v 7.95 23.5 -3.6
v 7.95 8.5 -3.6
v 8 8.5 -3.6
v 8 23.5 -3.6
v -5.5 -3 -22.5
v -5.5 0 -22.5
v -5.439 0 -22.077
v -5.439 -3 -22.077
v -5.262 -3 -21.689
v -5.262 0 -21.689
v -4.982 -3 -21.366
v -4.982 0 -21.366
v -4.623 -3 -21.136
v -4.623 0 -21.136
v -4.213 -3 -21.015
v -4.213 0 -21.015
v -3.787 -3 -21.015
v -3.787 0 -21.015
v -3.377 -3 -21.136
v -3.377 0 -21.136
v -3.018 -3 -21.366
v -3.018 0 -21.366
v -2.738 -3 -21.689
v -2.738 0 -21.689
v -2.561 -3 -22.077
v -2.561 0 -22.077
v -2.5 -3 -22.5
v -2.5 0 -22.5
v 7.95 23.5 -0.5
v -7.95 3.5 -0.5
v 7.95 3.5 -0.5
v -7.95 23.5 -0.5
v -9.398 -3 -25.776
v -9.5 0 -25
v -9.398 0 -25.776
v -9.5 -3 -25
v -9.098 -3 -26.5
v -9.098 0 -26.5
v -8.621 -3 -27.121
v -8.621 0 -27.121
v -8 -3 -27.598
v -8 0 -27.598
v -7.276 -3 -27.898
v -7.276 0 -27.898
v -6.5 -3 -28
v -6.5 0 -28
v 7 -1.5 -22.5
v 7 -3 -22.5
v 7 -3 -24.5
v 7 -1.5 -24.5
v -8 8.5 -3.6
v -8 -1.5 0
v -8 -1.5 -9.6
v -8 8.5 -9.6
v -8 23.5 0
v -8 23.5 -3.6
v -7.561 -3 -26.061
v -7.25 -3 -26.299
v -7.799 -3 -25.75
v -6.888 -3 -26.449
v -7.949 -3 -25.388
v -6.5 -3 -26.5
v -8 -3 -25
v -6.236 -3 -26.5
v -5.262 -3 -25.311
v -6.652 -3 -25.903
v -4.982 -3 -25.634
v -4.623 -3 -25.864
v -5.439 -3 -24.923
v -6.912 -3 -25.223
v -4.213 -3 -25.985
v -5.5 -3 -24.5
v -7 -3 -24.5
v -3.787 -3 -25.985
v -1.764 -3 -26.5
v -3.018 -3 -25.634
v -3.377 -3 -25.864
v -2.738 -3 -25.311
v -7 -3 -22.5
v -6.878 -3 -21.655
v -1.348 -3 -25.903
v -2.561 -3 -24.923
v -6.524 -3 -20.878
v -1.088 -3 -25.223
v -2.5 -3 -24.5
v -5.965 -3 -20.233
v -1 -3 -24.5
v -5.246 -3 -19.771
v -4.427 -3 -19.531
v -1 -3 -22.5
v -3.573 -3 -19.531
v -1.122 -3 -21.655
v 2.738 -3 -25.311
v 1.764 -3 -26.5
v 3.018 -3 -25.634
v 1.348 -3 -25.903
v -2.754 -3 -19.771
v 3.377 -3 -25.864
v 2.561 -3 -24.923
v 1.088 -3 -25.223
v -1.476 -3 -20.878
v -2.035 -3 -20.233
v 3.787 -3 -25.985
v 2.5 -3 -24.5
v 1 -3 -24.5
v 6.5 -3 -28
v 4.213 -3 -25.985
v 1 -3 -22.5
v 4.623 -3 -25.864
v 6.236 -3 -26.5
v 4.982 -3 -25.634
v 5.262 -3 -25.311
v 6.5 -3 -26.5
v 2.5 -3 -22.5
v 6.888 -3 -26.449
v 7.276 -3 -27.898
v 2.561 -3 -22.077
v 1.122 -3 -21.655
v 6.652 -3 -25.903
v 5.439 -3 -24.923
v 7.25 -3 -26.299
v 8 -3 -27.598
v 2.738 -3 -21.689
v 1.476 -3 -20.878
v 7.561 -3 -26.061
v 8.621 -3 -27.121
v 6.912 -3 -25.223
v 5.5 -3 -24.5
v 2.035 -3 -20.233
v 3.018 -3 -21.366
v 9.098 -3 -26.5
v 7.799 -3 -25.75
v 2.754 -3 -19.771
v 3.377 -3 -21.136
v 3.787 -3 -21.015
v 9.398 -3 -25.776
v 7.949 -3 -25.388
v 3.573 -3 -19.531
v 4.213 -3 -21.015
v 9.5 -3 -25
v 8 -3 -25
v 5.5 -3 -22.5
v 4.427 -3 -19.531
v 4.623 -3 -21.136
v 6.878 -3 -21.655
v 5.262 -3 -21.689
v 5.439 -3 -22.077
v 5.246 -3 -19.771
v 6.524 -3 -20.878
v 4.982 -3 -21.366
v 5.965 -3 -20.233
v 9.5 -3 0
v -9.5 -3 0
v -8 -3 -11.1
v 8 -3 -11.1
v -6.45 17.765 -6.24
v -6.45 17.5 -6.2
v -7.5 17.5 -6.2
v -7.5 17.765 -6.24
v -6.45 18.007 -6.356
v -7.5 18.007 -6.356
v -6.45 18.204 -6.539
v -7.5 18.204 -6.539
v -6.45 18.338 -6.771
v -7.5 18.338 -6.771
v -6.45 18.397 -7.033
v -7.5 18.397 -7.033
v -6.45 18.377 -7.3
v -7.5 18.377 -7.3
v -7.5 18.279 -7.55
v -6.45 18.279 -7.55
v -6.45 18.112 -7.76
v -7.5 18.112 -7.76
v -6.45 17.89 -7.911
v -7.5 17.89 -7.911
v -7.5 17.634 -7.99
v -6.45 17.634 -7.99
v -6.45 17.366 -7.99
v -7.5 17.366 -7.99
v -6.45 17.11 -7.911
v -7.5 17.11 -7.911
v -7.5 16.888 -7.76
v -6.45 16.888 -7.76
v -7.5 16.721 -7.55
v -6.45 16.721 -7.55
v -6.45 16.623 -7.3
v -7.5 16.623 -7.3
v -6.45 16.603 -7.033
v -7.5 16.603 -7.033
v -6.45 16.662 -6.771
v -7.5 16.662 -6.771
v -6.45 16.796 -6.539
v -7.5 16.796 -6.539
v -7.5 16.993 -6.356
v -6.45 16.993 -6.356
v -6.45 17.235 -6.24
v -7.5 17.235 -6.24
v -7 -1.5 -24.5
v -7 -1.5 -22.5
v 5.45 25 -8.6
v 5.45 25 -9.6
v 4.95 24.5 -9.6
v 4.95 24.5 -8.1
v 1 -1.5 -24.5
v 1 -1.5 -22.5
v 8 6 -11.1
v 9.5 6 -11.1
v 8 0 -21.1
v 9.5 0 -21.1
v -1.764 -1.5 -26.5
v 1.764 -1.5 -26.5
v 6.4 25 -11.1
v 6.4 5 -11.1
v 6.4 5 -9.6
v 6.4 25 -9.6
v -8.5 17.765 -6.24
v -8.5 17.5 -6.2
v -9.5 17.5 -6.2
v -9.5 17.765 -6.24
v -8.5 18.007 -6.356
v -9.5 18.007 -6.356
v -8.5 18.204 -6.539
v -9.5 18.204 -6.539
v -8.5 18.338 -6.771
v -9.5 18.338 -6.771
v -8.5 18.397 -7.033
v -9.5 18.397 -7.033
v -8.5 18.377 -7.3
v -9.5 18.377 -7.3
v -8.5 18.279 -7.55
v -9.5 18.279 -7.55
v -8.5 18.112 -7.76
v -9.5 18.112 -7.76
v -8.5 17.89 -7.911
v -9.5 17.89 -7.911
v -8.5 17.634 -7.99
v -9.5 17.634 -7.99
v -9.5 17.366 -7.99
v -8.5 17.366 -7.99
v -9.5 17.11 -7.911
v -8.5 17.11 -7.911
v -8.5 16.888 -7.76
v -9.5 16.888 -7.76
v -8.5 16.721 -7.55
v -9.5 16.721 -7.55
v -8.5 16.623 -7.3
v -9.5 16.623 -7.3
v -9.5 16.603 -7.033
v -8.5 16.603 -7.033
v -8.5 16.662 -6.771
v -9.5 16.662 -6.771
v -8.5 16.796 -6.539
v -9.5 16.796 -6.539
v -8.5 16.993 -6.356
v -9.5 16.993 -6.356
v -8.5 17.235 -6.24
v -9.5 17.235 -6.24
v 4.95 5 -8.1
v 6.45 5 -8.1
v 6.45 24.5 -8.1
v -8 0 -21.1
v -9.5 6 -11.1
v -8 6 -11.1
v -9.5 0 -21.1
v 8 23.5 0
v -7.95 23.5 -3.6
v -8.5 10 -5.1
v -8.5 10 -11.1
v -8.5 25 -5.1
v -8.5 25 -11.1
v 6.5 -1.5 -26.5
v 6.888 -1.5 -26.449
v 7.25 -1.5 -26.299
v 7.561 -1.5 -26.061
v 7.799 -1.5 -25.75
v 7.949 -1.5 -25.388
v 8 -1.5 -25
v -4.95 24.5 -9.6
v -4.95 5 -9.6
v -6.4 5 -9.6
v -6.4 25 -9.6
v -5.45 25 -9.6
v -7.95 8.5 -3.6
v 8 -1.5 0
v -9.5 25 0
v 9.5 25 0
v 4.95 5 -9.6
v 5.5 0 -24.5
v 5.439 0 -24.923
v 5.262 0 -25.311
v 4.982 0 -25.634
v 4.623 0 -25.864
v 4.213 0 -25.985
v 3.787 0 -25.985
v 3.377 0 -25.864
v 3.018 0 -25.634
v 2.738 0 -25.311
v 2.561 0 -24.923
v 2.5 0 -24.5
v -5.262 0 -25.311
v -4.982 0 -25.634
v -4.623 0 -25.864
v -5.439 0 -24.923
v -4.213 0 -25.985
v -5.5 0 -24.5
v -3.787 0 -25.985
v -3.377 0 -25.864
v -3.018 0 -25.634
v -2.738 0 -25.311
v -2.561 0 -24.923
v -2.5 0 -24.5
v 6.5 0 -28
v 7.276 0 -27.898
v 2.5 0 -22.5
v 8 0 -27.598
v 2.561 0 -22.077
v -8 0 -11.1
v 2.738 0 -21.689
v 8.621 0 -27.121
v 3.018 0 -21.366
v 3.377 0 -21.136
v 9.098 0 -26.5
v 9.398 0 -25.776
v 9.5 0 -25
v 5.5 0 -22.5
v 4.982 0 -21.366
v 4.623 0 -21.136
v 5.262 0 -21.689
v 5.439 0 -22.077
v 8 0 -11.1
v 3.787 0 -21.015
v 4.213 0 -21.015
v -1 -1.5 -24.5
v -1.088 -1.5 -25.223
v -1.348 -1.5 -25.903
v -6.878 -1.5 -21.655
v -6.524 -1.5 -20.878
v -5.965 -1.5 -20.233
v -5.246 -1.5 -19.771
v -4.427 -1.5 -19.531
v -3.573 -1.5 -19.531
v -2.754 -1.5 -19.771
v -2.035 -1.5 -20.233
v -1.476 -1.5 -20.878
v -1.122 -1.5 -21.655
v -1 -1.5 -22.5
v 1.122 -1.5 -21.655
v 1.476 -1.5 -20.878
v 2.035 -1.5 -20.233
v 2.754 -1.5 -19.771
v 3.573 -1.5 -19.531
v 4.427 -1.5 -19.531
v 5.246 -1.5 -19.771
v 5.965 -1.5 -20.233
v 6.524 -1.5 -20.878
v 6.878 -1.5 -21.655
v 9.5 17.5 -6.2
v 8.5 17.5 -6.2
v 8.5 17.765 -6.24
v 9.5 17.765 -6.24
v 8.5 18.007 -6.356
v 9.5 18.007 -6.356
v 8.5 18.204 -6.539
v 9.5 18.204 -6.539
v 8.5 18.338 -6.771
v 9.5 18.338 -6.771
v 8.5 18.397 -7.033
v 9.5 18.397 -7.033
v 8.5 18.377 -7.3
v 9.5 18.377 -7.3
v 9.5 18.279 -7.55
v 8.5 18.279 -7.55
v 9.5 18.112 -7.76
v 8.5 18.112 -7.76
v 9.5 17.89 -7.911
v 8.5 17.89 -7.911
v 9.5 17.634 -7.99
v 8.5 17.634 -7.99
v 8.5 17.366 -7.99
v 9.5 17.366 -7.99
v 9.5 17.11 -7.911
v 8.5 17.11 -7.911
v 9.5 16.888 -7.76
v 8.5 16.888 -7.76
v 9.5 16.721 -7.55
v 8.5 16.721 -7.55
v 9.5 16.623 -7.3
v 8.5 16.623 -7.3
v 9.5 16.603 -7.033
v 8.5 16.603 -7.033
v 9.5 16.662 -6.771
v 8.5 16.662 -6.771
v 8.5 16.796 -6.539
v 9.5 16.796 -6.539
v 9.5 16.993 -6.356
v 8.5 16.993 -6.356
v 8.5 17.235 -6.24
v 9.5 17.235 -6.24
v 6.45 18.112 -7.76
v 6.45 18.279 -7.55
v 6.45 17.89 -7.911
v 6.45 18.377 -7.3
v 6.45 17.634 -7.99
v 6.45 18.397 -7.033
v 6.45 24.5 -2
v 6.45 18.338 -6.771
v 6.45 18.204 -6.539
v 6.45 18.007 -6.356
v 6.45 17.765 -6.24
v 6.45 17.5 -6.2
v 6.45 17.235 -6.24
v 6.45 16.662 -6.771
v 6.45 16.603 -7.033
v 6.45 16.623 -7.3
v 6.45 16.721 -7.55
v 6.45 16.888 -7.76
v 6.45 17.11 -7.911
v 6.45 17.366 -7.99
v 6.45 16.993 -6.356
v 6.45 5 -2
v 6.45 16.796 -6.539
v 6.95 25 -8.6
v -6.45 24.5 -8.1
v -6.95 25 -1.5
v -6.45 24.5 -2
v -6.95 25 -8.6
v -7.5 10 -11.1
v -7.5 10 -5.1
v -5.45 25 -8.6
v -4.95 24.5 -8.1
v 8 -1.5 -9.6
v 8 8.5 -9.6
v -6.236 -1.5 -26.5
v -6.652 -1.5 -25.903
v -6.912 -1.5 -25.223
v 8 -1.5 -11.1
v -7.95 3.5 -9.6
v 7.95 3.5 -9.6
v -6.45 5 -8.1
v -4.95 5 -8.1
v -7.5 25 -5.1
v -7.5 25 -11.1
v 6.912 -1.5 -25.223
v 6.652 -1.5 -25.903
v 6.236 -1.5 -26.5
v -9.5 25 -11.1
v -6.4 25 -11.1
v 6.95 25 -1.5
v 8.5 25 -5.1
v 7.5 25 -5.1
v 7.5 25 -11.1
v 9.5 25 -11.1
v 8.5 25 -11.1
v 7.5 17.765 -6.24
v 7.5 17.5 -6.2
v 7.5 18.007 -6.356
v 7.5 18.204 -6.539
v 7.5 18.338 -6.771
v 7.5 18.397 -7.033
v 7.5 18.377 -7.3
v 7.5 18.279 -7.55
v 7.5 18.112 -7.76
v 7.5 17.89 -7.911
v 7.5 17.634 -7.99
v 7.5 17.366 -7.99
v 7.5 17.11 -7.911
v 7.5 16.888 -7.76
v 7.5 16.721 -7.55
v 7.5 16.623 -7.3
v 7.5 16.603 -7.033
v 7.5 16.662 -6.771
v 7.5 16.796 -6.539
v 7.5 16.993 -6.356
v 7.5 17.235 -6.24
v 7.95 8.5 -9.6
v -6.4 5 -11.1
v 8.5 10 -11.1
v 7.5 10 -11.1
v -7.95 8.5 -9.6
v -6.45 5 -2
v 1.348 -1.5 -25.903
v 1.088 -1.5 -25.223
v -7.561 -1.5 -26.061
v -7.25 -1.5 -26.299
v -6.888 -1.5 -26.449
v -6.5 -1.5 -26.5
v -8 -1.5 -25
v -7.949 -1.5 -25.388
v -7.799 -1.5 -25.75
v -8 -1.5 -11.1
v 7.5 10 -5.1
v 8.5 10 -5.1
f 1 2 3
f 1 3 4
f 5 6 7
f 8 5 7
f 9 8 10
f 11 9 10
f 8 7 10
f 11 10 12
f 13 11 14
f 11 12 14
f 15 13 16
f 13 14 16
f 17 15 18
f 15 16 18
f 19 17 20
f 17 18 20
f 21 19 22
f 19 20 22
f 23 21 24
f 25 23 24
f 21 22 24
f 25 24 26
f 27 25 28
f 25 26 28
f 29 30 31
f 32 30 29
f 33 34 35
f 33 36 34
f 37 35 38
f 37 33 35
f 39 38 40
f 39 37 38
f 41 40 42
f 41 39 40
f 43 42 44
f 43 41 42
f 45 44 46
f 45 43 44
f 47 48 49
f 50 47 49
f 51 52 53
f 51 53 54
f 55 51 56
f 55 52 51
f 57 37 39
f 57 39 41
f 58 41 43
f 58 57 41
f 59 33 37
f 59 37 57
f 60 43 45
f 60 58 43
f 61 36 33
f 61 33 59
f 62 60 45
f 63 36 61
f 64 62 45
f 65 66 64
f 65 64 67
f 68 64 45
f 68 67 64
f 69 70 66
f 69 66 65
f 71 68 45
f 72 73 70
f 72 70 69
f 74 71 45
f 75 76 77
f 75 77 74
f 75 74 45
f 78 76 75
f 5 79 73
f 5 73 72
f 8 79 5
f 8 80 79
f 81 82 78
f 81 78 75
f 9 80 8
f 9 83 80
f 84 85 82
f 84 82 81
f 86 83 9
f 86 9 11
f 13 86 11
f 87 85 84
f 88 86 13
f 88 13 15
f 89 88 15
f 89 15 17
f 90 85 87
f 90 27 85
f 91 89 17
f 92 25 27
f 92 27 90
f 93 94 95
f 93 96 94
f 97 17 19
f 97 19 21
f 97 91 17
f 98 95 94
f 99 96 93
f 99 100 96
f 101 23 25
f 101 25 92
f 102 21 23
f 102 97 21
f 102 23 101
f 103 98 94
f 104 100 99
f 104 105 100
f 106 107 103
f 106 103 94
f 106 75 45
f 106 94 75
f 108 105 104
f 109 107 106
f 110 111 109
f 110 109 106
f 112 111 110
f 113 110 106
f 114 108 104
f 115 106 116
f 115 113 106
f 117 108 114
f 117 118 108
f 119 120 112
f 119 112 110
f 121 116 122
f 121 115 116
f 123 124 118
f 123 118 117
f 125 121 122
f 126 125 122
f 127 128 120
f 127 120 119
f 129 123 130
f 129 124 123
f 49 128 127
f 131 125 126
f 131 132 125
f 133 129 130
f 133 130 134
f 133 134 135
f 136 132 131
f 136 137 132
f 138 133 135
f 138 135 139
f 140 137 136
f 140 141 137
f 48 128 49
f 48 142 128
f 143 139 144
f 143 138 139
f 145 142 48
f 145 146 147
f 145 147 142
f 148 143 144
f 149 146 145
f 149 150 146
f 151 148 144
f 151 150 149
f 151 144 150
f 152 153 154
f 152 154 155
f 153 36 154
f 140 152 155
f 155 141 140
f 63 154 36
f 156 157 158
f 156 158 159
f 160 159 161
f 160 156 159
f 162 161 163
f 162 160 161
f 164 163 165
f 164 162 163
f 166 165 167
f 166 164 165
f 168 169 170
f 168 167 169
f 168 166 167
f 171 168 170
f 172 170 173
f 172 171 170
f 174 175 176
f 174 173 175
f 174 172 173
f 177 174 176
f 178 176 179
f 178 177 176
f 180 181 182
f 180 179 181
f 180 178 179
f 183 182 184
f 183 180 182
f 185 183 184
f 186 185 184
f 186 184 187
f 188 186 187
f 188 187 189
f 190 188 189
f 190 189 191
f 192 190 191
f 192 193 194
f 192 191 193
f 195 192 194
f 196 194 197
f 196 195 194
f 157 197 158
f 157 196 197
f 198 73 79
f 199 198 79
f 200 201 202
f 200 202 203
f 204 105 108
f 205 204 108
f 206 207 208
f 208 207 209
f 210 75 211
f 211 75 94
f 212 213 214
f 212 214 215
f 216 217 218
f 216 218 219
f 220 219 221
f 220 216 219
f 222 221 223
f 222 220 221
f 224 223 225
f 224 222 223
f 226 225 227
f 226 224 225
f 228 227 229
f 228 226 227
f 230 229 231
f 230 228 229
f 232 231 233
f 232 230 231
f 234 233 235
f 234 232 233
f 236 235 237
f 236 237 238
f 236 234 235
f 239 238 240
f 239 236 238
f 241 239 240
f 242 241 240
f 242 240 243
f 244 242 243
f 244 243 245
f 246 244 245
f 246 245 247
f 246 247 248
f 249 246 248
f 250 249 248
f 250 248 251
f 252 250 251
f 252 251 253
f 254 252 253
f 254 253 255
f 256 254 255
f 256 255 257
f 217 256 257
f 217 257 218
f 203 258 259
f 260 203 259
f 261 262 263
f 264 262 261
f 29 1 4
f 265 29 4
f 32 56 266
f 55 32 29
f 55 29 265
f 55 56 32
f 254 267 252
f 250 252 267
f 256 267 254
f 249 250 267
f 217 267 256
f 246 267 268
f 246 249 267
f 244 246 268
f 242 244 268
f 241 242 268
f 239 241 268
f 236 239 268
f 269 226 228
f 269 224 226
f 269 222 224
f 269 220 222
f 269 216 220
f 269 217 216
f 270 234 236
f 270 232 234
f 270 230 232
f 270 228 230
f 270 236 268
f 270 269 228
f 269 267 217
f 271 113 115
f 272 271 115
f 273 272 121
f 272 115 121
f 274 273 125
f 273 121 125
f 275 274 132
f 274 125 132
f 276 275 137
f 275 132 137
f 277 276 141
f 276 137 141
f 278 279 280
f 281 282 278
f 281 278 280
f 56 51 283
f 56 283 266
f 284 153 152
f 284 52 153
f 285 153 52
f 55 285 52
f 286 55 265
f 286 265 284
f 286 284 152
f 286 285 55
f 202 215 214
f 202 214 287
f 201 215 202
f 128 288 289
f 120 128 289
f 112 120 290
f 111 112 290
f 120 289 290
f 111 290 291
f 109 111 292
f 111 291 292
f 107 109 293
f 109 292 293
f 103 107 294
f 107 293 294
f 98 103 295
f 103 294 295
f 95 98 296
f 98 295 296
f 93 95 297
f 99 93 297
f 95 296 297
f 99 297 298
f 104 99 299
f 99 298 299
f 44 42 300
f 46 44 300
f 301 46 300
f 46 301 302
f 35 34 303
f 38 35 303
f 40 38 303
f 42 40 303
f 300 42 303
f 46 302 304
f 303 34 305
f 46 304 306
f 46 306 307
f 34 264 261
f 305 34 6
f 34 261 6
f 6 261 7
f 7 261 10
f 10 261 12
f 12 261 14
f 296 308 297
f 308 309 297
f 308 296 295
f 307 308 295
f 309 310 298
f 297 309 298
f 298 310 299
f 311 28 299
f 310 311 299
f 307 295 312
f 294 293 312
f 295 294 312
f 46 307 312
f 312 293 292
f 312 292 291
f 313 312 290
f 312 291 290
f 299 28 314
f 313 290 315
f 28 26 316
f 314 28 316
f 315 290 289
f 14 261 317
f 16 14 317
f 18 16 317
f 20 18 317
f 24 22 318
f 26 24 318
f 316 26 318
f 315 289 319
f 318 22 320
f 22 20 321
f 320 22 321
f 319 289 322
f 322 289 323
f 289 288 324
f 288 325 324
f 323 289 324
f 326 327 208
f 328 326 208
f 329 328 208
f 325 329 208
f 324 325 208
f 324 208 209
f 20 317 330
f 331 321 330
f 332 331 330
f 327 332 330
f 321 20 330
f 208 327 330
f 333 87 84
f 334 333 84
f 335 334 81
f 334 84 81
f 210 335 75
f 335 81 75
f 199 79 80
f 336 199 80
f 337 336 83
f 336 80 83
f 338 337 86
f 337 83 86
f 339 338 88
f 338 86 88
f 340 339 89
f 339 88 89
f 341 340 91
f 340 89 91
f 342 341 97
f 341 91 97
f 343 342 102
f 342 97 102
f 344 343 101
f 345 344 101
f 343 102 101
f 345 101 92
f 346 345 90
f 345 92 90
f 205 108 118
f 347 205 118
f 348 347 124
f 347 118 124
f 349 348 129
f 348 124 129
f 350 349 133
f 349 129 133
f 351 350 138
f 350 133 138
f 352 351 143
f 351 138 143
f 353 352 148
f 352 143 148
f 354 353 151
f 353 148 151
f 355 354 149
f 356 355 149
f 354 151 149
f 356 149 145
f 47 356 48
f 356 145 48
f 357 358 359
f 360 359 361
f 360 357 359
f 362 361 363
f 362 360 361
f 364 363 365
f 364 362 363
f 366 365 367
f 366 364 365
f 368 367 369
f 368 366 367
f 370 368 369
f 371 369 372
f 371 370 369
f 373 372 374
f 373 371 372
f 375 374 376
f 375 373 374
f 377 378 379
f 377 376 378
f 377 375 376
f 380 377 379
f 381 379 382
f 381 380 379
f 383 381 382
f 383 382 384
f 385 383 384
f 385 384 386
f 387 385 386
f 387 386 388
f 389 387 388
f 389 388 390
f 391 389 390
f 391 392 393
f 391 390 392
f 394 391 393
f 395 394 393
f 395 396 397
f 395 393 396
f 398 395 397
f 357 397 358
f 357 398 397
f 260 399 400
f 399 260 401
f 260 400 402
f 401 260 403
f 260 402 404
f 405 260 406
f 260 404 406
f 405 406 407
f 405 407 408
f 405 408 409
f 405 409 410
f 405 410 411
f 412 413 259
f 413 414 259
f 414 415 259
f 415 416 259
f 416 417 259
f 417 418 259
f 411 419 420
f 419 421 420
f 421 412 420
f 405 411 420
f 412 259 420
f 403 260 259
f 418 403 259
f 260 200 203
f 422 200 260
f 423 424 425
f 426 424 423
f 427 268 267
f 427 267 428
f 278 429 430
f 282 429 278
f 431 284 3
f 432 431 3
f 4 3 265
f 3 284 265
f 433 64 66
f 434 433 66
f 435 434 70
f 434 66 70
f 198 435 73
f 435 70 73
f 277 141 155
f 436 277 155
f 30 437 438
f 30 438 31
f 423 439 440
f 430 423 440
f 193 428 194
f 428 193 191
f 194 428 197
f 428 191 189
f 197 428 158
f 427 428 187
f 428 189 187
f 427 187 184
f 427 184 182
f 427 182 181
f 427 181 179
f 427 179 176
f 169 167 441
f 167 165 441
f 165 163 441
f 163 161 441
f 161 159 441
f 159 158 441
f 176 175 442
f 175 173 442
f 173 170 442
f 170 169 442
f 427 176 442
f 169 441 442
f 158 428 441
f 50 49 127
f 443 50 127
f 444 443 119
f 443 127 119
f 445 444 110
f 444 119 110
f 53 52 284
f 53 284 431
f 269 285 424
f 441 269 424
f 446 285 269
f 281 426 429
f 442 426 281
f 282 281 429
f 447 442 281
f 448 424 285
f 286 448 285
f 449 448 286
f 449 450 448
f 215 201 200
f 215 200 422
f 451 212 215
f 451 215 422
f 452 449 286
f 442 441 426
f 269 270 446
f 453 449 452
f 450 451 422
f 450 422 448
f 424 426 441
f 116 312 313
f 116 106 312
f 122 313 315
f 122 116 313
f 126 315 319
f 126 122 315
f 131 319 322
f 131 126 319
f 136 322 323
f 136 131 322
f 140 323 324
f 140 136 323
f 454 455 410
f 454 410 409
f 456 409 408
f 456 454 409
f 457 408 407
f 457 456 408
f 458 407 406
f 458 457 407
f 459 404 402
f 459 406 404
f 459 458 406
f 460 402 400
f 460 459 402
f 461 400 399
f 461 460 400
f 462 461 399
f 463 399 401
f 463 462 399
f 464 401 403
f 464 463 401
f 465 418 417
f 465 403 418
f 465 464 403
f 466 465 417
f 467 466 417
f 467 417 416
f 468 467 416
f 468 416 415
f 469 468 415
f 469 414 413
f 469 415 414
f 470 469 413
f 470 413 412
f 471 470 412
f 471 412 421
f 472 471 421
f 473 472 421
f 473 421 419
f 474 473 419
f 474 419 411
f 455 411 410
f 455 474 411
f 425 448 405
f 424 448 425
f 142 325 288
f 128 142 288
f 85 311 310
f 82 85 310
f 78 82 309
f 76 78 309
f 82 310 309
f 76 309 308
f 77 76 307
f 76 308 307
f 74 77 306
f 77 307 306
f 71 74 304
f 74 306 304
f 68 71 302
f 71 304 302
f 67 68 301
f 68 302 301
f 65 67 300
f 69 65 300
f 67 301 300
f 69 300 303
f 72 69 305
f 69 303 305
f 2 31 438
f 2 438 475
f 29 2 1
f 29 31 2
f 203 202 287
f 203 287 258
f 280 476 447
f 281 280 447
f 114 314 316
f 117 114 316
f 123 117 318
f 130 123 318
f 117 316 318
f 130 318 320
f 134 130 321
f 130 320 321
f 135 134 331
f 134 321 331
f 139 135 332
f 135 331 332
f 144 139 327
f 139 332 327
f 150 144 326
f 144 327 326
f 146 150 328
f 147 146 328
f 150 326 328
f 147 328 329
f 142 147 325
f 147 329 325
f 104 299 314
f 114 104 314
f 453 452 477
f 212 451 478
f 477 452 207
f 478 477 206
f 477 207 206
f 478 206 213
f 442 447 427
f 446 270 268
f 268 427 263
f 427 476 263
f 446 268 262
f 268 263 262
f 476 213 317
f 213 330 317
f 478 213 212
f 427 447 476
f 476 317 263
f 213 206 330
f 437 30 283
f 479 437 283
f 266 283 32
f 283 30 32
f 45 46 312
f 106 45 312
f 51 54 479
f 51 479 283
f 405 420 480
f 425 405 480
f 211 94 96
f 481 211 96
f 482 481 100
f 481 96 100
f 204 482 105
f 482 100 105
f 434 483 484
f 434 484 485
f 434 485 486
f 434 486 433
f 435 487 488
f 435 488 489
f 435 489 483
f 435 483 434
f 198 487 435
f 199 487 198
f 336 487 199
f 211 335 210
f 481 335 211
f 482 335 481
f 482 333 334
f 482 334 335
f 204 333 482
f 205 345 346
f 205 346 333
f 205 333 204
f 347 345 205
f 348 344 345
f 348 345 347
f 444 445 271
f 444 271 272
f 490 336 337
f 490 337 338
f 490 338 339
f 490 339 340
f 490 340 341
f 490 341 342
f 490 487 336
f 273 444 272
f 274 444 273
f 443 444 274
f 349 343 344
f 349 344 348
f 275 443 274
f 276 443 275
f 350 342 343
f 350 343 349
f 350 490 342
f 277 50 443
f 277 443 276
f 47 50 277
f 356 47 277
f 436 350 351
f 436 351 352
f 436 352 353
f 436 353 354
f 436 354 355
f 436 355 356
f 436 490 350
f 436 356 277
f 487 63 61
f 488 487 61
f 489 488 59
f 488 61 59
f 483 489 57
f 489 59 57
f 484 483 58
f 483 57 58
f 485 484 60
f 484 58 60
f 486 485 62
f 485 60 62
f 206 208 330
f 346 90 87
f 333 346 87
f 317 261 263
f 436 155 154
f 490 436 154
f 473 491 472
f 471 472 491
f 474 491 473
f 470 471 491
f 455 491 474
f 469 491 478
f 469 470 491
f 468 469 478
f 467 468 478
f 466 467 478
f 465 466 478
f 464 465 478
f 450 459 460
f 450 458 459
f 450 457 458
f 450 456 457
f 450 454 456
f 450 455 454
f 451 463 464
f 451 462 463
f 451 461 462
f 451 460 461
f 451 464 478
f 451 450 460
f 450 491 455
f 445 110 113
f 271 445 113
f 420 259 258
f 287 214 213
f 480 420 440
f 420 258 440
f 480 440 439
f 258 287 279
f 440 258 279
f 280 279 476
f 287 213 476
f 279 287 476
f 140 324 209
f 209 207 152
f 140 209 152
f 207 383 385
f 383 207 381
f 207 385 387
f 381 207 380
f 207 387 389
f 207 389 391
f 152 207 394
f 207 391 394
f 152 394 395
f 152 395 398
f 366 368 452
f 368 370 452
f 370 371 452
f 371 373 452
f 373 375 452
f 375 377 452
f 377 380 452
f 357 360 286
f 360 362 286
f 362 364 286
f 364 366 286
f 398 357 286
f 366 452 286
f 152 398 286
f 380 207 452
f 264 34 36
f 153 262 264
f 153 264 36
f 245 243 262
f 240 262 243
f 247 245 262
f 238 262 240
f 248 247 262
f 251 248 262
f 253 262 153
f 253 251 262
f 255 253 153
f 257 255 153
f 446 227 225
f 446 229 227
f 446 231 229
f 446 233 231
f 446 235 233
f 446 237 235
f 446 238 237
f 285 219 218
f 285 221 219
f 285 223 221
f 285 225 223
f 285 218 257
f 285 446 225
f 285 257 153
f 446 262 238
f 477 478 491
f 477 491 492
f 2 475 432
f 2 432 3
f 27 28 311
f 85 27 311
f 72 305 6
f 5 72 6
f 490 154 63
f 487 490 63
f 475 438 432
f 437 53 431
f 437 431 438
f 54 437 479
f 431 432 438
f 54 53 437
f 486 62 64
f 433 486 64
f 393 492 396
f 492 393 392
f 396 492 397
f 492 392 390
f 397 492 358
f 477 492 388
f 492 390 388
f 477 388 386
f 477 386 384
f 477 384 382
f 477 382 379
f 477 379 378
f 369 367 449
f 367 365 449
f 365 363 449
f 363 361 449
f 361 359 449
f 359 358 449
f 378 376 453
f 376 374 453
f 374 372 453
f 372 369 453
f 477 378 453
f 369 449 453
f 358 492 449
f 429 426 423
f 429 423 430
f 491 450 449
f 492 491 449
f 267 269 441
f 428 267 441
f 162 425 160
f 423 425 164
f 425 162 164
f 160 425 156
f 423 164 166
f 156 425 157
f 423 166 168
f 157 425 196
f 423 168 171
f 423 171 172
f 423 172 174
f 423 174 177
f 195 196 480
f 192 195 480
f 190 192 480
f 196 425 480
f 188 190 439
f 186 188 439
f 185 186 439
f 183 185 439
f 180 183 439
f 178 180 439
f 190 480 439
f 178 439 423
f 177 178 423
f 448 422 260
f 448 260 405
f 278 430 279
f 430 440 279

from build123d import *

# Parameters (mm, degrees)
EXTRUDE_1_DEPTH     = 25
SKETCH_2_W          = 19
SKETCH_2_H          = 28
EXTRUDE_2_DEPTH     = 3
SKETCH_3_W          = 1
SKETCH_3_H          = 6
CUT_EXTRUDE_1_DEPTH = 15
CUT_EXTRUDE_START   = -19
SKETCH_4_R          = 0.9
CUT_EXTRUDE_2_DEPTH = 19
FILLET_1_R          = 3
EXTRUDE_3_DEPTH     = 1.5
EXTRUDE_4_DEPTH     = 5
CHAMFER_1_SIZE      = 0.5
SHELL_START         = -8
SHELL_1_DEPTH       = 16
SHELL_1_2_DEPTH     = 0.05
SHELL_START_2       = 7.95
SHELL_1_3_DEPTH     = 0.05
CUT_EXTRUDE_3_DEPTH = 1.5
SKETCH_8_W          = 12.8
SKETCH_8_H          = 20
CUT_EXTRUDE_4_DEPTH = 1.5


# Read off the part's stored shape, not the designer's step: 抽壳1
with BuildPart() as part:
    # 草图1 → 凸台-拉伸1 (new body)
    with BuildSketch(Plane(origin=(0, 0, 0), x_dir=(1, 0, 0), z_dir=(0, 1, 0))):
        Polygon((-9.5, 11.1), (-9.5, 0), (9.5, 0), (9.5, 11.1), (4.95, 11.1), (4.95, 8.1), (6.45, 8.1), (6.45, 2), (-6.45, 2), (-6.45, 8.1), (-4.95, 8.1), (-4.95, 11.1), align=None)
    extrude(amount=EXTRUDE_1_DEPTH)

    # 草图2 → 凸台-拉伸2 (add)
    with BuildSketch(Plane.XZ):
        with Locations((0, -14)):
            Rectangle(SKETCH_2_W, SKETCH_2_H)
        with BuildLine():
            Line((-2.5, -22.5), (-2.5, -24.5))
            ThreePointArc((-2.5, -24.5), (-4, -26), (-5.5, -24.5))
            Line((-5.5, -24.5), (-5.5, -22.5))
            ThreePointArc((-5.5, -22.5), (-4, -21), (-2.5, -22.5))
        make_face(mode=Mode.SUBTRACT)
        with BuildLine():
            Line((2.5, -24.5), (2.5, -22.5))
            ThreePointArc((2.5, -22.5), (4, -21), (5.5, -22.5))
            Line((5.5, -22.5), (5.5, -24.5))
            ThreePointArc((5.5, -24.5), (4, -26), (2.5, -24.5))
        make_face(mode=Mode.SUBTRACT)
    extrude(amount=EXTRUDE_2_DEPTH)

    # 草图3 → 切除-拉伸1 (cut)
    with BuildSketch(Plane(origin=(0, 25, 0), x_dir=(1, 0, 0), z_dir=(0, 1, 0))):
        with Locations((-8, 8.1)):
            Rectangle(SKETCH_3_W, SKETCH_3_H)
        with Locations((8, 8.1)):
            Rectangle(SKETCH_3_W, SKETCH_3_H)
    extrude(amount=-CUT_EXTRUDE_1_DEPTH, mode=Mode.SUBTRACT)

    # 草图4 → 切除-拉伸2 (cut)
    with BuildSketch(Plane.ZY.offset(9.5).offset(CUT_EXTRUDE_START)):
        with Locations((-7.1, 17.5)):
            Circle(SKETCH_4_R)
    extrude(amount=CUT_EXTRUDE_2_DEPTH, mode=Mode.SUBTRACT)

    # 圆角1
    fillet_1_edges = [part.edges().sort_by_distance(p)[0] for p in [
        (9.5, -1.5, -28),
        (-9.5, -1.5, -28),
    ]]
    fillet(fillet_1_edges, radius=FILLET_1_R)

    # 草图5 → 凸台-拉伸3 (add)
    with BuildSketch(Plane.ZY.offset(9.5)):
        Polygon((-11.1, 0), (-11.1, 6), (-21.1, 0), align=None)
    extrude_3 = extrude(amount=-EXTRUDE_3_DEPTH)

    # 镜向1: 凸台-拉伸3 across plane
    add(extrude_3.mirror(Plane(origin=(0, 0, 0), x_dir=(0, 0, 1), z_dir=(1, 0, 0))))

    # 草图6 → 凸台-拉伸4 (add)
    with BuildSketch(Plane(origin=(0, 0, 0), x_dir=(1, 0, 0), z_dir=(0, 1, 0))):
        Polygon((-6.45, 2), (6.45, 2), (6.45, 8.1), (4.95, 8.1), (4.95, 11.1), (-4.95, 11.1), (-4.95, 8.1), (-6.45, 8.1), align=None)
    extrude(amount=EXTRUDE_4_DEPTH)

    # 倒角1
    chamfer_1_edges = [part.edges().sort_by_distance(p)[0] for p in [
        (4.95, 25, -9.6),
        (5.7, 25, -8.1),
        (6.45, 25, -5.05),
        (0, 25, -2),
        (-6.45, 25, -5.05),
        (-5.7, 25, -8.1),
        (-4.95, 25, -9.6),
    ]]
    chamfer(chamfer_1_edges, length=CHAMFER_1_SIZE)

    # 抽壳1 outline → 抽壳1 (cut)
    with BuildSketch(Plane.YZ.offset(SHELL_START)):
        Polygon((3.5, -0.5), (23.5, -0.5), (23.5, 0), (-1.5, 0), (-1.5, -9.6), (3.5, -9.6), align=None)
    extrude(amount=SHELL_1_DEPTH, mode=Mode.SUBTRACT)

    # Shell 1 2 outline → Shell 1 2 (cut)
    with BuildSketch(Plane.YZ.offset(SHELL_START)):
        Polygon((8.5, -3.6), (23.5, -3.6), (23.5, -0.5), (3.5, -0.5), (3.5, -9.6), (8.5, -9.6), align=None)
    extrude(amount=SHELL_1_2_DEPTH, mode=Mode.SUBTRACT)

    # Shell 1 3 outline → Shell 1 3 (cut)
    with BuildSketch(Plane.YZ.offset(SHELL_START_2)):
        Polygon((8.5, -3.6), (23.5, -3.6), (23.5, -0.5), (3.5, -0.5), (3.5, -9.6), (8.5, -9.6), align=None)
    extrude(amount=SHELL_1_3_DEPTH, mode=Mode.SUBTRACT)

    # 草图7 → 切除-拉伸3 (cut)
    with BuildSketch(Plane.XZ.offset(3)):
        with BuildLine():
            Line((8, -11.1), (-8, -11.1))
            Line((-8, -11.1), (-8, -25))
            ThreePointArc((-8, -25), (-7.560660172, -26.060660172), (-6.5, -26.5))
            Line((-6.5, -26.5), (-6.236067977, -26.5))
            ThreePointArc((-6.236067977, -26.5), (-6.802517077, -25.570466269), (-7, -24.5))
            Line((-7, -24.5), (-7, -22.5))
            ThreePointArc((-7, -22.5), (-4, -19.5), (-1, -22.5))
            Line((-1, -22.5), (-1, -24.5))
            ThreePointArc((-1, -24.5), (-1.197482923, -25.570466269), (-1.763932023, -26.5))
            Line((-1.763932023, -26.5), (1.763932023, -26.5))
            ThreePointArc((1.763932023, -26.5), (1.197482923, -25.570466269), (1, -24.5))
            Line((1, -24.5), (1, -22.5))
            ThreePointArc((1, -22.5), (4, -19.5), (7, -22.5))
            Line((7, -22.5), (7, -24.5))
            ThreePointArc((7, -24.5), (6.802517077, -25.570466269), (6.236067977, -26.5))
            Line((6.236067977, -26.5), (6.5, -26.5))
            ThreePointArc((6.5, -26.5), (7.560660172, -26.060660172), (8, -25))
            Line((8, -25), (8, -11.1))
        make_face()
    extrude(amount=-CUT_EXTRUDE_3_DEPTH, mode=Mode.SUBTRACT)

    # 草图8 → 切除-拉伸4 (cut)
    with BuildSketch(Plane(origin=(0, 0, -11.1), x_dir=(-1, 0, 0), z_dir=(0, 0, -1))):
        with Locations((0, 15)):
            Rectangle(SKETCH_8_W, SKETCH_8_H)
    extrude(amount=-CUT_EXTRUDE_4_DEPTH, mode=Mode.SUBTRACT)


solid = part.part
